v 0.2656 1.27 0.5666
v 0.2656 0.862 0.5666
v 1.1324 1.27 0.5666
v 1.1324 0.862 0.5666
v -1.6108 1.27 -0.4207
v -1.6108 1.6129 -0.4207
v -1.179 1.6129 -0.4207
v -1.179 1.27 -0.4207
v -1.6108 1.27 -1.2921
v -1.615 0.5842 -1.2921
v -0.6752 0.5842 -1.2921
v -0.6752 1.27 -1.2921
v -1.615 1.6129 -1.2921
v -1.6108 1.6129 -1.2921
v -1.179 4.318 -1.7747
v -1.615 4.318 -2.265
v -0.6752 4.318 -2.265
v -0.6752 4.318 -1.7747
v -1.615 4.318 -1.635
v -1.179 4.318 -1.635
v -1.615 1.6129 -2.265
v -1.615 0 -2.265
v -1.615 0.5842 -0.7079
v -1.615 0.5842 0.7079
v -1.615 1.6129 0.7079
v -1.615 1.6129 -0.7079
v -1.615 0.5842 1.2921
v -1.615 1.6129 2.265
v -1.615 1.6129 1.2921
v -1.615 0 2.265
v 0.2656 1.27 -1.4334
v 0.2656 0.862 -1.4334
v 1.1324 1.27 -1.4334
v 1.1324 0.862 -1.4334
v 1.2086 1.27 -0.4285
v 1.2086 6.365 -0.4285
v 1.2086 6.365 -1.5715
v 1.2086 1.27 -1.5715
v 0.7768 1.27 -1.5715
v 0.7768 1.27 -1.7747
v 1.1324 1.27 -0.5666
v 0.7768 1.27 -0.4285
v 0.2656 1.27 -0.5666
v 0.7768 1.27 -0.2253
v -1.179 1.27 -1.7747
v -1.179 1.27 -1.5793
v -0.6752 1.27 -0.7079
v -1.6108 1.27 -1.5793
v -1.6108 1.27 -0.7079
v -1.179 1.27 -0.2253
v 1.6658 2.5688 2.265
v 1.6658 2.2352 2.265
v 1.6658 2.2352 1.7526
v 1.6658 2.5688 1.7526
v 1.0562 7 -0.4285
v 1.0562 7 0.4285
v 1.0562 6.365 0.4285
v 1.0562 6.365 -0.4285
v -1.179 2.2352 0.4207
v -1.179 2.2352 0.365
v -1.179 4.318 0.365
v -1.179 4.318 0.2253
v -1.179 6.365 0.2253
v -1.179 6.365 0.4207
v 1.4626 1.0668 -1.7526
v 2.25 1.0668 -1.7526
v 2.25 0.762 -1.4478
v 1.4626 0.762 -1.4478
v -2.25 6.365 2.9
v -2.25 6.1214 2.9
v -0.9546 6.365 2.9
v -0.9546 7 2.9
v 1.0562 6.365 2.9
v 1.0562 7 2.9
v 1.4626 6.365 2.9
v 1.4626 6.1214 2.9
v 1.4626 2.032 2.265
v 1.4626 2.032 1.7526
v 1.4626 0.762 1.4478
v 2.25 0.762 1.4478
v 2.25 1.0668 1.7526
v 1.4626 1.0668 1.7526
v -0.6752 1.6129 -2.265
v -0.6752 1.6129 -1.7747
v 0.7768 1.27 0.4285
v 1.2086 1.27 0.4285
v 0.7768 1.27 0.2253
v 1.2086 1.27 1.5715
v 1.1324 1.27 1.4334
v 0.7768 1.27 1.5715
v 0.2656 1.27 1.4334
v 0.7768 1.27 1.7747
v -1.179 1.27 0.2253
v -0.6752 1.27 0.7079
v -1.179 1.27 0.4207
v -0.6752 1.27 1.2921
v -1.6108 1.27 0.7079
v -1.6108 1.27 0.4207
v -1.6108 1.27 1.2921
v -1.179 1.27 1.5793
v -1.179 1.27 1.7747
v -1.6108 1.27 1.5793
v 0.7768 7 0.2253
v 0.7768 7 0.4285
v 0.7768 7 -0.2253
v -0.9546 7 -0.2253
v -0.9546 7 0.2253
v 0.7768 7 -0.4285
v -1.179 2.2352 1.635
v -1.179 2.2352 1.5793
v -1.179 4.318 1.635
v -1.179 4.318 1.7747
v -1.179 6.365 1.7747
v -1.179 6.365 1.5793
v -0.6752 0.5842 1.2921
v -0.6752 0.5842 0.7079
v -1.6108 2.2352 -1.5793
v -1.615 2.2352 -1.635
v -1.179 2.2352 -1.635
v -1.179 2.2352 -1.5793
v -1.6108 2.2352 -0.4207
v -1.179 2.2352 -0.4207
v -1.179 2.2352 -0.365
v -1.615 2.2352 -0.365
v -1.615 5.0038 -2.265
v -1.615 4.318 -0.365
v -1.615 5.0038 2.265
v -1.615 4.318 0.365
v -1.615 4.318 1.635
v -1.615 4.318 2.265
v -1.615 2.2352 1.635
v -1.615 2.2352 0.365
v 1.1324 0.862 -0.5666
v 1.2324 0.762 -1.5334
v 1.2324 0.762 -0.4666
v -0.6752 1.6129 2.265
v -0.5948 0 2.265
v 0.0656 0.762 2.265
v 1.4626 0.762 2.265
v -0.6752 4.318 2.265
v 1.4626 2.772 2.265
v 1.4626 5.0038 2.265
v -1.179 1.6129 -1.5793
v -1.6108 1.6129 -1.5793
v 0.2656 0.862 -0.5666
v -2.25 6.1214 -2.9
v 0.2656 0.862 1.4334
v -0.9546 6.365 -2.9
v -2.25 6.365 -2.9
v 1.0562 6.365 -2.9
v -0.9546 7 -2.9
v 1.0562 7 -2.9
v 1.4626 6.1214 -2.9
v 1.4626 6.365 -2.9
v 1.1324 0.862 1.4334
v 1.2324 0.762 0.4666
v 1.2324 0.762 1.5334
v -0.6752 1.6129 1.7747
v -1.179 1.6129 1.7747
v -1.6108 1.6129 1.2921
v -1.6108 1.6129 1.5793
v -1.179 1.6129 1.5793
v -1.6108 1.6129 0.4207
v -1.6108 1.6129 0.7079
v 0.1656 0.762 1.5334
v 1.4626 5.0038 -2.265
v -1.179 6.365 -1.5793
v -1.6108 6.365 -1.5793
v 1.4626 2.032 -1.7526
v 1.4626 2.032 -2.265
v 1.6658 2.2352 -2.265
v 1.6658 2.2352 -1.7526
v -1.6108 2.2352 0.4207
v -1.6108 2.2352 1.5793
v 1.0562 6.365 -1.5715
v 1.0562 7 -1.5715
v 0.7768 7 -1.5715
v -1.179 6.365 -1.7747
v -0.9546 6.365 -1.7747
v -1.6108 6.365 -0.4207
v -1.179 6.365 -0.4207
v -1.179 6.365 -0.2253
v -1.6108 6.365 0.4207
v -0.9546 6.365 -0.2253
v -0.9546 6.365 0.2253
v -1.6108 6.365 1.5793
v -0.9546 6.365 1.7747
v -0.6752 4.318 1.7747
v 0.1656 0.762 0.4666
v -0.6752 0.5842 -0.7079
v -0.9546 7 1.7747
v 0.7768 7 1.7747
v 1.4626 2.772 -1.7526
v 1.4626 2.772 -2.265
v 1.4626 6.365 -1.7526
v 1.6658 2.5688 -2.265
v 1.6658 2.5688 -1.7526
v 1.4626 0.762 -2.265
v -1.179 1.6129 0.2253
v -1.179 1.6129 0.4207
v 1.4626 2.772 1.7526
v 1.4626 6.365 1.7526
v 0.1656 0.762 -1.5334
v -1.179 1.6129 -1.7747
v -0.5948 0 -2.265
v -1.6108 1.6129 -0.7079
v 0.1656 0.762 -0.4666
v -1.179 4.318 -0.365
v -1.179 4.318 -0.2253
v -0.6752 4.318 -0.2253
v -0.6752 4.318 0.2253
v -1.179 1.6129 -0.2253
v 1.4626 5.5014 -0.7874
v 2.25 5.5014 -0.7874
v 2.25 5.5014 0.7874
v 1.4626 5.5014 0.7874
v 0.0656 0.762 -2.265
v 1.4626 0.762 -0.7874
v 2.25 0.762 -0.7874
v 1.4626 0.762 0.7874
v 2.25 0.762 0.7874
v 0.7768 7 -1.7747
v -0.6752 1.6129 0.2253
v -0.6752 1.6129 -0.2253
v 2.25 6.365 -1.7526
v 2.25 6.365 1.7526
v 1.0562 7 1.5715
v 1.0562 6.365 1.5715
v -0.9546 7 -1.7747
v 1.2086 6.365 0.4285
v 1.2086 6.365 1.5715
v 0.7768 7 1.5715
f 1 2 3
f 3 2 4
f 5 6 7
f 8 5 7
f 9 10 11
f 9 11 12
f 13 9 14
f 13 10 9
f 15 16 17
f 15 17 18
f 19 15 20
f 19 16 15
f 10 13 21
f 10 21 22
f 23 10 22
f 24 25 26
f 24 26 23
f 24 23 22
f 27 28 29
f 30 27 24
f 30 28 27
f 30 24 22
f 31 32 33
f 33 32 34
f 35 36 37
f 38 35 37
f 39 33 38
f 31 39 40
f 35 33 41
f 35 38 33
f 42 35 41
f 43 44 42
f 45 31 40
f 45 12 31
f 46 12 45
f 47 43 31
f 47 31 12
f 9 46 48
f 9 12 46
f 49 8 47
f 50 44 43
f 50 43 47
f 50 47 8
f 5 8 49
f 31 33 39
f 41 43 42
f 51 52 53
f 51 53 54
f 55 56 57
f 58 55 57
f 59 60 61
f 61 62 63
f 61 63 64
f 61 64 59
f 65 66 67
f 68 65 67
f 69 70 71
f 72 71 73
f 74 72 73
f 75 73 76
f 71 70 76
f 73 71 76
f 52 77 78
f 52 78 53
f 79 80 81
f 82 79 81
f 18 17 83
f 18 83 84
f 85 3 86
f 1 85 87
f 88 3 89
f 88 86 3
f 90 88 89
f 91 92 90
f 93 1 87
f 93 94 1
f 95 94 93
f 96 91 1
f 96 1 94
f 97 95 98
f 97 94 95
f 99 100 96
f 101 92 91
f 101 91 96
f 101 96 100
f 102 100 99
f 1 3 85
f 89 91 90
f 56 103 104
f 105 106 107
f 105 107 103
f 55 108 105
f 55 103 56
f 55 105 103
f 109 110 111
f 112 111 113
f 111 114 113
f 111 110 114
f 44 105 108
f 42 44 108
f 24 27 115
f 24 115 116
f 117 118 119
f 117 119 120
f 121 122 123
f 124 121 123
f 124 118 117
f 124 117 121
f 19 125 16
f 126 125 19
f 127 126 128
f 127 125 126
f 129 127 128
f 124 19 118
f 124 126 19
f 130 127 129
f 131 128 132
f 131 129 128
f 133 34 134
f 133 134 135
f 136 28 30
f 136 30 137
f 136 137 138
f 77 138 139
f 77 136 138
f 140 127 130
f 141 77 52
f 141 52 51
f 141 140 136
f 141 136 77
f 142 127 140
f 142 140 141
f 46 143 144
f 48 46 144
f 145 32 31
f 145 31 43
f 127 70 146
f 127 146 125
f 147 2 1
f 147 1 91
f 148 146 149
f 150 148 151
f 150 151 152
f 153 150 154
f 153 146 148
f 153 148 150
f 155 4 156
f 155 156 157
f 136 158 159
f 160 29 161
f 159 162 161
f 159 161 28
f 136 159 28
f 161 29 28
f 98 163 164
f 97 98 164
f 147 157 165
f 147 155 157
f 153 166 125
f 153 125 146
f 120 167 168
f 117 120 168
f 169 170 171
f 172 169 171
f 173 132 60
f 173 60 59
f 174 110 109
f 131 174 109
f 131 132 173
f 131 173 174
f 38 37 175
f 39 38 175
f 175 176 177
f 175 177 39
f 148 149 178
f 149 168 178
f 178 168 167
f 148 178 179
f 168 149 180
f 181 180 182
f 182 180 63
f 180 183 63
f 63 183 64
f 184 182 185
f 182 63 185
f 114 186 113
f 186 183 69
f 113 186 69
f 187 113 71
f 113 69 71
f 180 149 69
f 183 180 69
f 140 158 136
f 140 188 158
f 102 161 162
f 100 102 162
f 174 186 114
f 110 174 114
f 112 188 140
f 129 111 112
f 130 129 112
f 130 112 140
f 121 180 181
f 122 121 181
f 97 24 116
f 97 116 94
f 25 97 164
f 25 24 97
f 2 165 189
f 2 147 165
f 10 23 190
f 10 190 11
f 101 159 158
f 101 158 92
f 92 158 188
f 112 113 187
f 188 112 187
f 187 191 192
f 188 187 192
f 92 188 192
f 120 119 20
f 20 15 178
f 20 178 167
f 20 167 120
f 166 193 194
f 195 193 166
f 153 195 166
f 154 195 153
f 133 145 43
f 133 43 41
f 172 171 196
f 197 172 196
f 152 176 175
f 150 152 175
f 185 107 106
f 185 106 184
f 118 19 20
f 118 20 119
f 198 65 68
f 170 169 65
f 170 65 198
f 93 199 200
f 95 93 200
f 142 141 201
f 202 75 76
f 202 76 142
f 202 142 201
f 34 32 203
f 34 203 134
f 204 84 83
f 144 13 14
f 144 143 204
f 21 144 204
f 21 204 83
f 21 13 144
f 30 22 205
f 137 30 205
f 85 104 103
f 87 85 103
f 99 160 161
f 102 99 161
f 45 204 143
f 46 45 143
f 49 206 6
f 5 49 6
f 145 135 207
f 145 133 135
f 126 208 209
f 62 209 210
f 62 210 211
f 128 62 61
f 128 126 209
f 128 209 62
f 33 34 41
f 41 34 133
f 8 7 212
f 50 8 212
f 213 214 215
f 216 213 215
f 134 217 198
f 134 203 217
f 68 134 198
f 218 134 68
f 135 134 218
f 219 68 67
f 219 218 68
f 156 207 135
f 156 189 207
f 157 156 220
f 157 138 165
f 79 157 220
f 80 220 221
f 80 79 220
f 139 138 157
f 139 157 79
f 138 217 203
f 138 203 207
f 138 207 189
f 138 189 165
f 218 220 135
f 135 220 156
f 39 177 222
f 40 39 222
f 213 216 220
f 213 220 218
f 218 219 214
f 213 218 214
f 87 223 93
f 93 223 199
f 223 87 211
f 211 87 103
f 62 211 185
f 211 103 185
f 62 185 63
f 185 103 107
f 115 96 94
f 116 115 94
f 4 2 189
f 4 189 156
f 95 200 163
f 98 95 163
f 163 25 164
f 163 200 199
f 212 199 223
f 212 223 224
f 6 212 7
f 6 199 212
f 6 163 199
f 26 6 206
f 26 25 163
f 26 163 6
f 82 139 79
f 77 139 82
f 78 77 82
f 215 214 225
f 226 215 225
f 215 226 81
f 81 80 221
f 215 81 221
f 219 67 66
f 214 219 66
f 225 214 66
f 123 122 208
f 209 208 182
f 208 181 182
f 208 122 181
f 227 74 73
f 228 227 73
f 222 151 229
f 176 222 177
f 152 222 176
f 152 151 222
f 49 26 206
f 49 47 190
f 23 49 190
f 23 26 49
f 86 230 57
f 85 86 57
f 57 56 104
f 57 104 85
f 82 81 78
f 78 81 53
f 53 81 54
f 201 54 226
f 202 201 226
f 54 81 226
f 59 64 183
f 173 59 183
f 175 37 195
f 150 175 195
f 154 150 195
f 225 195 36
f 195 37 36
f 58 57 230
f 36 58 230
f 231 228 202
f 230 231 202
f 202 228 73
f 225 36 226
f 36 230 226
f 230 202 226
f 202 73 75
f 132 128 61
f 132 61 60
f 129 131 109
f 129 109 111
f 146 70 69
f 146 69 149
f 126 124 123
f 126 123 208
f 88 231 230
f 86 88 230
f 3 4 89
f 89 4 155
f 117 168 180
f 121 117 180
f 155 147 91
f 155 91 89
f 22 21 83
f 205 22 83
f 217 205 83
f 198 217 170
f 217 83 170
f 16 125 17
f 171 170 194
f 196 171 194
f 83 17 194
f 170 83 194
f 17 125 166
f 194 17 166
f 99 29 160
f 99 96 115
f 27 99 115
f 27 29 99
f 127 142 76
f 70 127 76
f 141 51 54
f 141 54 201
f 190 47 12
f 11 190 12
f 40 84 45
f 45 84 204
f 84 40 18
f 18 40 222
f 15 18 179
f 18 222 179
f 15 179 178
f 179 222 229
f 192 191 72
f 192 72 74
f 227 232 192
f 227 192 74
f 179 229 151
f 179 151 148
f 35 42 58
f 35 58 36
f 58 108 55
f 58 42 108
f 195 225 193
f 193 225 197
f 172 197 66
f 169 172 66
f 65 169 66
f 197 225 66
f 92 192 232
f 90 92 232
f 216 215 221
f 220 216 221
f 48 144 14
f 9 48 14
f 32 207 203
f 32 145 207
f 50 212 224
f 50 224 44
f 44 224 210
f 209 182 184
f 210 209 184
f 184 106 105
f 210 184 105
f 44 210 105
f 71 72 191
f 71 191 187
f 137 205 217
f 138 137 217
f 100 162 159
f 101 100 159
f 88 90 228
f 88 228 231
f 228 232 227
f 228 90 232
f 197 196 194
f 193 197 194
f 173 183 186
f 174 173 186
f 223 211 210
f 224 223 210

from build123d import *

# Parameters (mm, degrees)
SKETCH1_W                  = 4.5
SKETCH1_H                  = 5.8
EXTRUDE1_DEPTH             = 7
SKETCH10_W                 = 1.2954
SKETCH10_H                 = 0.635
SKETCH10_W_2               = 1.1938
CUT_EXTRUDE7_DEPTH         = 6.8
CUT_EXTRUDE13_DEPTH        = 5.5
SKETCH3_W                  = 1.0668
SKETCH3_H                  = 1.0668
MATING_SIDE_CHAMFERS_DEPTH = 0.508
MATING_SIDE_CHAMFERS_TAPER = 45
SKETCH18_W                 = 5.8
SKETCH18_H                 = 7
POLARIZING_KEYWAY_DEPTH    = 0.7874
SKETCH4_W                  = 0.8668
SKETCH4_H                  = 0.8668
TERMINAL_HOLES_DEPTH       = 8
SKETCH14_W                 = 0.8668
SKETCH14_H                 = 0.8668
TERMINAL_CUTOUT_DEPTH      = 5.73
RAMP1_DEPTH                = 0.7874
TERMINALLOCK_CUTOUT_DEPTH  = 0.9398
SKETCH20_W                 = 0.249
SKETCH20_H                 = 2.7051
CUT_EXTRUDE16_DEPTH        = 0.9398
LPATTERN2_COUNT            = 2
LPATTERN2_PITCH            = 2


with BuildPart() as part:
    # Sketch1 → Extrude1 (new body)
    with BuildSketch(Plane(origin=(0, 0, 0), x_dir=(1, 0, 0), z_dir=(0, 1, 0))):
        Rectangle(SKETCH1_W, SKETCH1_H)
    extrude(amount=EXTRUDE1_DEPTH)

    # Sketch10 → Cut-Extrude7 (cut, through all)
    with BuildSketch(Plane(origin=(0, 4.9, 2.9), x_dir=(1, 0, 0), z_dir=(0, 0, -1))):
        Polygon((-0.5948, 4.9), (0.0656, 4.138), (2.25, 4.138), (2.25, 4.9), align=None)
        Polygon((-2.25, -1.2214), (-1.615, -0.1038), (-1.615, 4.9), (-2.25, 4.9), align=None)
        with Locations((-1.6023, -1.7825)):
            Rectangle(SKETCH10_W, SKETCH10_H)
        with Locations((1.6531, -1.7825)):
            Rectangle(SKETCH10_W_2, SKETCH10_H)
    extrude(amount=CUT_EXTRUDE7_DEPTH, mode=Mode.SUBTRACT)

    # Sketch17 → Cut-Extrude13 (cut, through all)
    with BuildSketch(Plane(origin=(2.25, 0, 0), x_dir=(0, 0, -1), z_dir=(1, 0, 0))):
        Polygon((-2.9, 0), (-2.265, 0), (-2.265, 5.0038), (-2.9, 6.1214), align=None)
        Polygon((2.9, 0), (2.265, 0), (2.265, 5.0038), (2.9, 6.1214), align=None)
    extrude(amount=-CUT_EXTRUDE13_DEPTH, mode=Mode.SUBTRACT)

    # Sketch3 → Mating Side Chamfers (cut)
    with BuildSketch(Plane.XZ.offset(-0.762)):
        with Locations((0.699, 1)):
            Rectangle(SKETCH3_W, SKETCH3_H)
    mating_side_chamfers = extrude(amount=-MATING_SIDE_CHAMFERS_DEPTH, taper=MATING_SIDE_CHAMFERS_TAPER, mode=Mode.SUBTRACT)

    # Sketch18 → Polarizing Keyway (cut)
    with BuildSketch(Plane(origin=(2.25, 0, 0), x_dir=(0, 0, -1), z_dir=(1, 0, 0))):
        with Locations((0, 3.5)):
            Rectangle(SKETCH18_W, SKETCH18_H)
        Polygon((0.7874, 0.762), (0.7874, 5.5014), (-0.7874, 5.5014), (-0.7874, 0.762), (-1.4478, 0.762), (-1.7526, 1.0668), (-1.7526, 6.365), (1.7526, 6.365), (1.7526, 1.0668), (1.4478, 0.762), align=None, mode=Mode.SUBTRACT)
    extrude(amount=-POLARIZING_KEYWAY_DEPTH, mode=Mode.SUBTRACT)

    # Sketch4 → Terminal Holes (cut, through all)
    with BuildSketch(Plane.XZ):
        with Locations((0.699, 1)):
            Rectangle(SKETCH4_W, SKETCH4_H)
    terminal_holes = extrude(amount=-TERMINAL_HOLES_DEPTH, mode=Mode.SUBTRACT)

    # Sketch14 → Terminal Cutout (cut)
    with BuildSketch(Plane(origin=(0, 7, 0), x_dir=(-1, 0, 0), z_dir=(0, 1, 0))):
        Polygon((1.6108, 0.42074158), (1.6108, 1.57925842), (1.179, 1.57925842), (1.179, 1.7747), (-0.7768, 1.7747), (-0.7768, 1.5715), (-1.2086, 1.5715), (-1.2086, 1), (-1.2086, 0.4285), (-0.7768, 0.4285), (-0.7768, 0.2253), (1.179, 0.2253), (1.179, 0.42074158), align=None)
        with Locations((-0.699, 1)):
            Rectangle(SKETCH14_W, SKETCH14_H, mode=Mode.SUBTRACT)
    terminal_cutout = extrude(amount=-TERMINAL_CUTOUT_DEPTH, mode=Mode.SUBTRACT)

    # Sketch11 → Ramp1 (add)
    with BuildSketch(Plane.XY.offset(2.265)):
        Polygon((1.4626, 2.77196042), (1.4626, 2.032), (1.6658, 2.2352), (1.6658, 2.56876042), align=None)
    ramp1 = extrude(amount=-RAMP1_DEPTH)

    # Sketch19 → TerminalLock Cutout (cut)
    with BuildSketch(Plane.ZY.offset(1.615)):
        Polygon((0.365, 4.318), (0.365, 2.2352), (1.635, 2.2352), (1.635, 4.318), (2.016, 4.318), (2.016, 1.6129), (1.2921, 1.6129), (1.2921, 0.5842), (0.7079, 0.5842), (0.7079, 1.6129), (-0.016, 1.6129), (-0.016, 4.318), align=None)
    terminallock_cutout = extrude(amount=-TERMINALLOCK_CUTOUT_DEPTH, mode=Mode.SUBTRACT)

    # Sketch20 → Cut-Extrude16 (cut)
    with BuildSketch(Plane.ZY.offset(1.615)):
        with Locations((2.1405, 2.96545)):
            Rectangle(SKETCH20_W, SKETCH20_H)
        with Locations((-2.1405, 2.96545)):
            Rectangle(SKETCH20_W, SKETCH20_H)
    extrude(amount=-CUT_EXTRUDE16_DEPTH, mode=Mode.SUBTRACT)

    # LPattern2: Mating Side Chamfers, Terminal Holes, Terminal Cutout, TerminalLock Cutout ×2
    with Locations(*[(0, 0, -i * LPATTERN2_PITCH) for i in range(1, LPATTERN2_COUNT)]):
        add(mating_side_chamfers, mode=Mode.SUBTRACT)
        add(terminal_holes, mode=Mode.SUBTRACT)
        add(terminal_cutout, mode=Mode.SUBTRACT)
        add(terminallock_cutout, mode=Mode.SUBTRACT)

    # Mirror1: Ramp1 across plane
    add(ramp1.mirror(Plane.XY))


solid = part.part
